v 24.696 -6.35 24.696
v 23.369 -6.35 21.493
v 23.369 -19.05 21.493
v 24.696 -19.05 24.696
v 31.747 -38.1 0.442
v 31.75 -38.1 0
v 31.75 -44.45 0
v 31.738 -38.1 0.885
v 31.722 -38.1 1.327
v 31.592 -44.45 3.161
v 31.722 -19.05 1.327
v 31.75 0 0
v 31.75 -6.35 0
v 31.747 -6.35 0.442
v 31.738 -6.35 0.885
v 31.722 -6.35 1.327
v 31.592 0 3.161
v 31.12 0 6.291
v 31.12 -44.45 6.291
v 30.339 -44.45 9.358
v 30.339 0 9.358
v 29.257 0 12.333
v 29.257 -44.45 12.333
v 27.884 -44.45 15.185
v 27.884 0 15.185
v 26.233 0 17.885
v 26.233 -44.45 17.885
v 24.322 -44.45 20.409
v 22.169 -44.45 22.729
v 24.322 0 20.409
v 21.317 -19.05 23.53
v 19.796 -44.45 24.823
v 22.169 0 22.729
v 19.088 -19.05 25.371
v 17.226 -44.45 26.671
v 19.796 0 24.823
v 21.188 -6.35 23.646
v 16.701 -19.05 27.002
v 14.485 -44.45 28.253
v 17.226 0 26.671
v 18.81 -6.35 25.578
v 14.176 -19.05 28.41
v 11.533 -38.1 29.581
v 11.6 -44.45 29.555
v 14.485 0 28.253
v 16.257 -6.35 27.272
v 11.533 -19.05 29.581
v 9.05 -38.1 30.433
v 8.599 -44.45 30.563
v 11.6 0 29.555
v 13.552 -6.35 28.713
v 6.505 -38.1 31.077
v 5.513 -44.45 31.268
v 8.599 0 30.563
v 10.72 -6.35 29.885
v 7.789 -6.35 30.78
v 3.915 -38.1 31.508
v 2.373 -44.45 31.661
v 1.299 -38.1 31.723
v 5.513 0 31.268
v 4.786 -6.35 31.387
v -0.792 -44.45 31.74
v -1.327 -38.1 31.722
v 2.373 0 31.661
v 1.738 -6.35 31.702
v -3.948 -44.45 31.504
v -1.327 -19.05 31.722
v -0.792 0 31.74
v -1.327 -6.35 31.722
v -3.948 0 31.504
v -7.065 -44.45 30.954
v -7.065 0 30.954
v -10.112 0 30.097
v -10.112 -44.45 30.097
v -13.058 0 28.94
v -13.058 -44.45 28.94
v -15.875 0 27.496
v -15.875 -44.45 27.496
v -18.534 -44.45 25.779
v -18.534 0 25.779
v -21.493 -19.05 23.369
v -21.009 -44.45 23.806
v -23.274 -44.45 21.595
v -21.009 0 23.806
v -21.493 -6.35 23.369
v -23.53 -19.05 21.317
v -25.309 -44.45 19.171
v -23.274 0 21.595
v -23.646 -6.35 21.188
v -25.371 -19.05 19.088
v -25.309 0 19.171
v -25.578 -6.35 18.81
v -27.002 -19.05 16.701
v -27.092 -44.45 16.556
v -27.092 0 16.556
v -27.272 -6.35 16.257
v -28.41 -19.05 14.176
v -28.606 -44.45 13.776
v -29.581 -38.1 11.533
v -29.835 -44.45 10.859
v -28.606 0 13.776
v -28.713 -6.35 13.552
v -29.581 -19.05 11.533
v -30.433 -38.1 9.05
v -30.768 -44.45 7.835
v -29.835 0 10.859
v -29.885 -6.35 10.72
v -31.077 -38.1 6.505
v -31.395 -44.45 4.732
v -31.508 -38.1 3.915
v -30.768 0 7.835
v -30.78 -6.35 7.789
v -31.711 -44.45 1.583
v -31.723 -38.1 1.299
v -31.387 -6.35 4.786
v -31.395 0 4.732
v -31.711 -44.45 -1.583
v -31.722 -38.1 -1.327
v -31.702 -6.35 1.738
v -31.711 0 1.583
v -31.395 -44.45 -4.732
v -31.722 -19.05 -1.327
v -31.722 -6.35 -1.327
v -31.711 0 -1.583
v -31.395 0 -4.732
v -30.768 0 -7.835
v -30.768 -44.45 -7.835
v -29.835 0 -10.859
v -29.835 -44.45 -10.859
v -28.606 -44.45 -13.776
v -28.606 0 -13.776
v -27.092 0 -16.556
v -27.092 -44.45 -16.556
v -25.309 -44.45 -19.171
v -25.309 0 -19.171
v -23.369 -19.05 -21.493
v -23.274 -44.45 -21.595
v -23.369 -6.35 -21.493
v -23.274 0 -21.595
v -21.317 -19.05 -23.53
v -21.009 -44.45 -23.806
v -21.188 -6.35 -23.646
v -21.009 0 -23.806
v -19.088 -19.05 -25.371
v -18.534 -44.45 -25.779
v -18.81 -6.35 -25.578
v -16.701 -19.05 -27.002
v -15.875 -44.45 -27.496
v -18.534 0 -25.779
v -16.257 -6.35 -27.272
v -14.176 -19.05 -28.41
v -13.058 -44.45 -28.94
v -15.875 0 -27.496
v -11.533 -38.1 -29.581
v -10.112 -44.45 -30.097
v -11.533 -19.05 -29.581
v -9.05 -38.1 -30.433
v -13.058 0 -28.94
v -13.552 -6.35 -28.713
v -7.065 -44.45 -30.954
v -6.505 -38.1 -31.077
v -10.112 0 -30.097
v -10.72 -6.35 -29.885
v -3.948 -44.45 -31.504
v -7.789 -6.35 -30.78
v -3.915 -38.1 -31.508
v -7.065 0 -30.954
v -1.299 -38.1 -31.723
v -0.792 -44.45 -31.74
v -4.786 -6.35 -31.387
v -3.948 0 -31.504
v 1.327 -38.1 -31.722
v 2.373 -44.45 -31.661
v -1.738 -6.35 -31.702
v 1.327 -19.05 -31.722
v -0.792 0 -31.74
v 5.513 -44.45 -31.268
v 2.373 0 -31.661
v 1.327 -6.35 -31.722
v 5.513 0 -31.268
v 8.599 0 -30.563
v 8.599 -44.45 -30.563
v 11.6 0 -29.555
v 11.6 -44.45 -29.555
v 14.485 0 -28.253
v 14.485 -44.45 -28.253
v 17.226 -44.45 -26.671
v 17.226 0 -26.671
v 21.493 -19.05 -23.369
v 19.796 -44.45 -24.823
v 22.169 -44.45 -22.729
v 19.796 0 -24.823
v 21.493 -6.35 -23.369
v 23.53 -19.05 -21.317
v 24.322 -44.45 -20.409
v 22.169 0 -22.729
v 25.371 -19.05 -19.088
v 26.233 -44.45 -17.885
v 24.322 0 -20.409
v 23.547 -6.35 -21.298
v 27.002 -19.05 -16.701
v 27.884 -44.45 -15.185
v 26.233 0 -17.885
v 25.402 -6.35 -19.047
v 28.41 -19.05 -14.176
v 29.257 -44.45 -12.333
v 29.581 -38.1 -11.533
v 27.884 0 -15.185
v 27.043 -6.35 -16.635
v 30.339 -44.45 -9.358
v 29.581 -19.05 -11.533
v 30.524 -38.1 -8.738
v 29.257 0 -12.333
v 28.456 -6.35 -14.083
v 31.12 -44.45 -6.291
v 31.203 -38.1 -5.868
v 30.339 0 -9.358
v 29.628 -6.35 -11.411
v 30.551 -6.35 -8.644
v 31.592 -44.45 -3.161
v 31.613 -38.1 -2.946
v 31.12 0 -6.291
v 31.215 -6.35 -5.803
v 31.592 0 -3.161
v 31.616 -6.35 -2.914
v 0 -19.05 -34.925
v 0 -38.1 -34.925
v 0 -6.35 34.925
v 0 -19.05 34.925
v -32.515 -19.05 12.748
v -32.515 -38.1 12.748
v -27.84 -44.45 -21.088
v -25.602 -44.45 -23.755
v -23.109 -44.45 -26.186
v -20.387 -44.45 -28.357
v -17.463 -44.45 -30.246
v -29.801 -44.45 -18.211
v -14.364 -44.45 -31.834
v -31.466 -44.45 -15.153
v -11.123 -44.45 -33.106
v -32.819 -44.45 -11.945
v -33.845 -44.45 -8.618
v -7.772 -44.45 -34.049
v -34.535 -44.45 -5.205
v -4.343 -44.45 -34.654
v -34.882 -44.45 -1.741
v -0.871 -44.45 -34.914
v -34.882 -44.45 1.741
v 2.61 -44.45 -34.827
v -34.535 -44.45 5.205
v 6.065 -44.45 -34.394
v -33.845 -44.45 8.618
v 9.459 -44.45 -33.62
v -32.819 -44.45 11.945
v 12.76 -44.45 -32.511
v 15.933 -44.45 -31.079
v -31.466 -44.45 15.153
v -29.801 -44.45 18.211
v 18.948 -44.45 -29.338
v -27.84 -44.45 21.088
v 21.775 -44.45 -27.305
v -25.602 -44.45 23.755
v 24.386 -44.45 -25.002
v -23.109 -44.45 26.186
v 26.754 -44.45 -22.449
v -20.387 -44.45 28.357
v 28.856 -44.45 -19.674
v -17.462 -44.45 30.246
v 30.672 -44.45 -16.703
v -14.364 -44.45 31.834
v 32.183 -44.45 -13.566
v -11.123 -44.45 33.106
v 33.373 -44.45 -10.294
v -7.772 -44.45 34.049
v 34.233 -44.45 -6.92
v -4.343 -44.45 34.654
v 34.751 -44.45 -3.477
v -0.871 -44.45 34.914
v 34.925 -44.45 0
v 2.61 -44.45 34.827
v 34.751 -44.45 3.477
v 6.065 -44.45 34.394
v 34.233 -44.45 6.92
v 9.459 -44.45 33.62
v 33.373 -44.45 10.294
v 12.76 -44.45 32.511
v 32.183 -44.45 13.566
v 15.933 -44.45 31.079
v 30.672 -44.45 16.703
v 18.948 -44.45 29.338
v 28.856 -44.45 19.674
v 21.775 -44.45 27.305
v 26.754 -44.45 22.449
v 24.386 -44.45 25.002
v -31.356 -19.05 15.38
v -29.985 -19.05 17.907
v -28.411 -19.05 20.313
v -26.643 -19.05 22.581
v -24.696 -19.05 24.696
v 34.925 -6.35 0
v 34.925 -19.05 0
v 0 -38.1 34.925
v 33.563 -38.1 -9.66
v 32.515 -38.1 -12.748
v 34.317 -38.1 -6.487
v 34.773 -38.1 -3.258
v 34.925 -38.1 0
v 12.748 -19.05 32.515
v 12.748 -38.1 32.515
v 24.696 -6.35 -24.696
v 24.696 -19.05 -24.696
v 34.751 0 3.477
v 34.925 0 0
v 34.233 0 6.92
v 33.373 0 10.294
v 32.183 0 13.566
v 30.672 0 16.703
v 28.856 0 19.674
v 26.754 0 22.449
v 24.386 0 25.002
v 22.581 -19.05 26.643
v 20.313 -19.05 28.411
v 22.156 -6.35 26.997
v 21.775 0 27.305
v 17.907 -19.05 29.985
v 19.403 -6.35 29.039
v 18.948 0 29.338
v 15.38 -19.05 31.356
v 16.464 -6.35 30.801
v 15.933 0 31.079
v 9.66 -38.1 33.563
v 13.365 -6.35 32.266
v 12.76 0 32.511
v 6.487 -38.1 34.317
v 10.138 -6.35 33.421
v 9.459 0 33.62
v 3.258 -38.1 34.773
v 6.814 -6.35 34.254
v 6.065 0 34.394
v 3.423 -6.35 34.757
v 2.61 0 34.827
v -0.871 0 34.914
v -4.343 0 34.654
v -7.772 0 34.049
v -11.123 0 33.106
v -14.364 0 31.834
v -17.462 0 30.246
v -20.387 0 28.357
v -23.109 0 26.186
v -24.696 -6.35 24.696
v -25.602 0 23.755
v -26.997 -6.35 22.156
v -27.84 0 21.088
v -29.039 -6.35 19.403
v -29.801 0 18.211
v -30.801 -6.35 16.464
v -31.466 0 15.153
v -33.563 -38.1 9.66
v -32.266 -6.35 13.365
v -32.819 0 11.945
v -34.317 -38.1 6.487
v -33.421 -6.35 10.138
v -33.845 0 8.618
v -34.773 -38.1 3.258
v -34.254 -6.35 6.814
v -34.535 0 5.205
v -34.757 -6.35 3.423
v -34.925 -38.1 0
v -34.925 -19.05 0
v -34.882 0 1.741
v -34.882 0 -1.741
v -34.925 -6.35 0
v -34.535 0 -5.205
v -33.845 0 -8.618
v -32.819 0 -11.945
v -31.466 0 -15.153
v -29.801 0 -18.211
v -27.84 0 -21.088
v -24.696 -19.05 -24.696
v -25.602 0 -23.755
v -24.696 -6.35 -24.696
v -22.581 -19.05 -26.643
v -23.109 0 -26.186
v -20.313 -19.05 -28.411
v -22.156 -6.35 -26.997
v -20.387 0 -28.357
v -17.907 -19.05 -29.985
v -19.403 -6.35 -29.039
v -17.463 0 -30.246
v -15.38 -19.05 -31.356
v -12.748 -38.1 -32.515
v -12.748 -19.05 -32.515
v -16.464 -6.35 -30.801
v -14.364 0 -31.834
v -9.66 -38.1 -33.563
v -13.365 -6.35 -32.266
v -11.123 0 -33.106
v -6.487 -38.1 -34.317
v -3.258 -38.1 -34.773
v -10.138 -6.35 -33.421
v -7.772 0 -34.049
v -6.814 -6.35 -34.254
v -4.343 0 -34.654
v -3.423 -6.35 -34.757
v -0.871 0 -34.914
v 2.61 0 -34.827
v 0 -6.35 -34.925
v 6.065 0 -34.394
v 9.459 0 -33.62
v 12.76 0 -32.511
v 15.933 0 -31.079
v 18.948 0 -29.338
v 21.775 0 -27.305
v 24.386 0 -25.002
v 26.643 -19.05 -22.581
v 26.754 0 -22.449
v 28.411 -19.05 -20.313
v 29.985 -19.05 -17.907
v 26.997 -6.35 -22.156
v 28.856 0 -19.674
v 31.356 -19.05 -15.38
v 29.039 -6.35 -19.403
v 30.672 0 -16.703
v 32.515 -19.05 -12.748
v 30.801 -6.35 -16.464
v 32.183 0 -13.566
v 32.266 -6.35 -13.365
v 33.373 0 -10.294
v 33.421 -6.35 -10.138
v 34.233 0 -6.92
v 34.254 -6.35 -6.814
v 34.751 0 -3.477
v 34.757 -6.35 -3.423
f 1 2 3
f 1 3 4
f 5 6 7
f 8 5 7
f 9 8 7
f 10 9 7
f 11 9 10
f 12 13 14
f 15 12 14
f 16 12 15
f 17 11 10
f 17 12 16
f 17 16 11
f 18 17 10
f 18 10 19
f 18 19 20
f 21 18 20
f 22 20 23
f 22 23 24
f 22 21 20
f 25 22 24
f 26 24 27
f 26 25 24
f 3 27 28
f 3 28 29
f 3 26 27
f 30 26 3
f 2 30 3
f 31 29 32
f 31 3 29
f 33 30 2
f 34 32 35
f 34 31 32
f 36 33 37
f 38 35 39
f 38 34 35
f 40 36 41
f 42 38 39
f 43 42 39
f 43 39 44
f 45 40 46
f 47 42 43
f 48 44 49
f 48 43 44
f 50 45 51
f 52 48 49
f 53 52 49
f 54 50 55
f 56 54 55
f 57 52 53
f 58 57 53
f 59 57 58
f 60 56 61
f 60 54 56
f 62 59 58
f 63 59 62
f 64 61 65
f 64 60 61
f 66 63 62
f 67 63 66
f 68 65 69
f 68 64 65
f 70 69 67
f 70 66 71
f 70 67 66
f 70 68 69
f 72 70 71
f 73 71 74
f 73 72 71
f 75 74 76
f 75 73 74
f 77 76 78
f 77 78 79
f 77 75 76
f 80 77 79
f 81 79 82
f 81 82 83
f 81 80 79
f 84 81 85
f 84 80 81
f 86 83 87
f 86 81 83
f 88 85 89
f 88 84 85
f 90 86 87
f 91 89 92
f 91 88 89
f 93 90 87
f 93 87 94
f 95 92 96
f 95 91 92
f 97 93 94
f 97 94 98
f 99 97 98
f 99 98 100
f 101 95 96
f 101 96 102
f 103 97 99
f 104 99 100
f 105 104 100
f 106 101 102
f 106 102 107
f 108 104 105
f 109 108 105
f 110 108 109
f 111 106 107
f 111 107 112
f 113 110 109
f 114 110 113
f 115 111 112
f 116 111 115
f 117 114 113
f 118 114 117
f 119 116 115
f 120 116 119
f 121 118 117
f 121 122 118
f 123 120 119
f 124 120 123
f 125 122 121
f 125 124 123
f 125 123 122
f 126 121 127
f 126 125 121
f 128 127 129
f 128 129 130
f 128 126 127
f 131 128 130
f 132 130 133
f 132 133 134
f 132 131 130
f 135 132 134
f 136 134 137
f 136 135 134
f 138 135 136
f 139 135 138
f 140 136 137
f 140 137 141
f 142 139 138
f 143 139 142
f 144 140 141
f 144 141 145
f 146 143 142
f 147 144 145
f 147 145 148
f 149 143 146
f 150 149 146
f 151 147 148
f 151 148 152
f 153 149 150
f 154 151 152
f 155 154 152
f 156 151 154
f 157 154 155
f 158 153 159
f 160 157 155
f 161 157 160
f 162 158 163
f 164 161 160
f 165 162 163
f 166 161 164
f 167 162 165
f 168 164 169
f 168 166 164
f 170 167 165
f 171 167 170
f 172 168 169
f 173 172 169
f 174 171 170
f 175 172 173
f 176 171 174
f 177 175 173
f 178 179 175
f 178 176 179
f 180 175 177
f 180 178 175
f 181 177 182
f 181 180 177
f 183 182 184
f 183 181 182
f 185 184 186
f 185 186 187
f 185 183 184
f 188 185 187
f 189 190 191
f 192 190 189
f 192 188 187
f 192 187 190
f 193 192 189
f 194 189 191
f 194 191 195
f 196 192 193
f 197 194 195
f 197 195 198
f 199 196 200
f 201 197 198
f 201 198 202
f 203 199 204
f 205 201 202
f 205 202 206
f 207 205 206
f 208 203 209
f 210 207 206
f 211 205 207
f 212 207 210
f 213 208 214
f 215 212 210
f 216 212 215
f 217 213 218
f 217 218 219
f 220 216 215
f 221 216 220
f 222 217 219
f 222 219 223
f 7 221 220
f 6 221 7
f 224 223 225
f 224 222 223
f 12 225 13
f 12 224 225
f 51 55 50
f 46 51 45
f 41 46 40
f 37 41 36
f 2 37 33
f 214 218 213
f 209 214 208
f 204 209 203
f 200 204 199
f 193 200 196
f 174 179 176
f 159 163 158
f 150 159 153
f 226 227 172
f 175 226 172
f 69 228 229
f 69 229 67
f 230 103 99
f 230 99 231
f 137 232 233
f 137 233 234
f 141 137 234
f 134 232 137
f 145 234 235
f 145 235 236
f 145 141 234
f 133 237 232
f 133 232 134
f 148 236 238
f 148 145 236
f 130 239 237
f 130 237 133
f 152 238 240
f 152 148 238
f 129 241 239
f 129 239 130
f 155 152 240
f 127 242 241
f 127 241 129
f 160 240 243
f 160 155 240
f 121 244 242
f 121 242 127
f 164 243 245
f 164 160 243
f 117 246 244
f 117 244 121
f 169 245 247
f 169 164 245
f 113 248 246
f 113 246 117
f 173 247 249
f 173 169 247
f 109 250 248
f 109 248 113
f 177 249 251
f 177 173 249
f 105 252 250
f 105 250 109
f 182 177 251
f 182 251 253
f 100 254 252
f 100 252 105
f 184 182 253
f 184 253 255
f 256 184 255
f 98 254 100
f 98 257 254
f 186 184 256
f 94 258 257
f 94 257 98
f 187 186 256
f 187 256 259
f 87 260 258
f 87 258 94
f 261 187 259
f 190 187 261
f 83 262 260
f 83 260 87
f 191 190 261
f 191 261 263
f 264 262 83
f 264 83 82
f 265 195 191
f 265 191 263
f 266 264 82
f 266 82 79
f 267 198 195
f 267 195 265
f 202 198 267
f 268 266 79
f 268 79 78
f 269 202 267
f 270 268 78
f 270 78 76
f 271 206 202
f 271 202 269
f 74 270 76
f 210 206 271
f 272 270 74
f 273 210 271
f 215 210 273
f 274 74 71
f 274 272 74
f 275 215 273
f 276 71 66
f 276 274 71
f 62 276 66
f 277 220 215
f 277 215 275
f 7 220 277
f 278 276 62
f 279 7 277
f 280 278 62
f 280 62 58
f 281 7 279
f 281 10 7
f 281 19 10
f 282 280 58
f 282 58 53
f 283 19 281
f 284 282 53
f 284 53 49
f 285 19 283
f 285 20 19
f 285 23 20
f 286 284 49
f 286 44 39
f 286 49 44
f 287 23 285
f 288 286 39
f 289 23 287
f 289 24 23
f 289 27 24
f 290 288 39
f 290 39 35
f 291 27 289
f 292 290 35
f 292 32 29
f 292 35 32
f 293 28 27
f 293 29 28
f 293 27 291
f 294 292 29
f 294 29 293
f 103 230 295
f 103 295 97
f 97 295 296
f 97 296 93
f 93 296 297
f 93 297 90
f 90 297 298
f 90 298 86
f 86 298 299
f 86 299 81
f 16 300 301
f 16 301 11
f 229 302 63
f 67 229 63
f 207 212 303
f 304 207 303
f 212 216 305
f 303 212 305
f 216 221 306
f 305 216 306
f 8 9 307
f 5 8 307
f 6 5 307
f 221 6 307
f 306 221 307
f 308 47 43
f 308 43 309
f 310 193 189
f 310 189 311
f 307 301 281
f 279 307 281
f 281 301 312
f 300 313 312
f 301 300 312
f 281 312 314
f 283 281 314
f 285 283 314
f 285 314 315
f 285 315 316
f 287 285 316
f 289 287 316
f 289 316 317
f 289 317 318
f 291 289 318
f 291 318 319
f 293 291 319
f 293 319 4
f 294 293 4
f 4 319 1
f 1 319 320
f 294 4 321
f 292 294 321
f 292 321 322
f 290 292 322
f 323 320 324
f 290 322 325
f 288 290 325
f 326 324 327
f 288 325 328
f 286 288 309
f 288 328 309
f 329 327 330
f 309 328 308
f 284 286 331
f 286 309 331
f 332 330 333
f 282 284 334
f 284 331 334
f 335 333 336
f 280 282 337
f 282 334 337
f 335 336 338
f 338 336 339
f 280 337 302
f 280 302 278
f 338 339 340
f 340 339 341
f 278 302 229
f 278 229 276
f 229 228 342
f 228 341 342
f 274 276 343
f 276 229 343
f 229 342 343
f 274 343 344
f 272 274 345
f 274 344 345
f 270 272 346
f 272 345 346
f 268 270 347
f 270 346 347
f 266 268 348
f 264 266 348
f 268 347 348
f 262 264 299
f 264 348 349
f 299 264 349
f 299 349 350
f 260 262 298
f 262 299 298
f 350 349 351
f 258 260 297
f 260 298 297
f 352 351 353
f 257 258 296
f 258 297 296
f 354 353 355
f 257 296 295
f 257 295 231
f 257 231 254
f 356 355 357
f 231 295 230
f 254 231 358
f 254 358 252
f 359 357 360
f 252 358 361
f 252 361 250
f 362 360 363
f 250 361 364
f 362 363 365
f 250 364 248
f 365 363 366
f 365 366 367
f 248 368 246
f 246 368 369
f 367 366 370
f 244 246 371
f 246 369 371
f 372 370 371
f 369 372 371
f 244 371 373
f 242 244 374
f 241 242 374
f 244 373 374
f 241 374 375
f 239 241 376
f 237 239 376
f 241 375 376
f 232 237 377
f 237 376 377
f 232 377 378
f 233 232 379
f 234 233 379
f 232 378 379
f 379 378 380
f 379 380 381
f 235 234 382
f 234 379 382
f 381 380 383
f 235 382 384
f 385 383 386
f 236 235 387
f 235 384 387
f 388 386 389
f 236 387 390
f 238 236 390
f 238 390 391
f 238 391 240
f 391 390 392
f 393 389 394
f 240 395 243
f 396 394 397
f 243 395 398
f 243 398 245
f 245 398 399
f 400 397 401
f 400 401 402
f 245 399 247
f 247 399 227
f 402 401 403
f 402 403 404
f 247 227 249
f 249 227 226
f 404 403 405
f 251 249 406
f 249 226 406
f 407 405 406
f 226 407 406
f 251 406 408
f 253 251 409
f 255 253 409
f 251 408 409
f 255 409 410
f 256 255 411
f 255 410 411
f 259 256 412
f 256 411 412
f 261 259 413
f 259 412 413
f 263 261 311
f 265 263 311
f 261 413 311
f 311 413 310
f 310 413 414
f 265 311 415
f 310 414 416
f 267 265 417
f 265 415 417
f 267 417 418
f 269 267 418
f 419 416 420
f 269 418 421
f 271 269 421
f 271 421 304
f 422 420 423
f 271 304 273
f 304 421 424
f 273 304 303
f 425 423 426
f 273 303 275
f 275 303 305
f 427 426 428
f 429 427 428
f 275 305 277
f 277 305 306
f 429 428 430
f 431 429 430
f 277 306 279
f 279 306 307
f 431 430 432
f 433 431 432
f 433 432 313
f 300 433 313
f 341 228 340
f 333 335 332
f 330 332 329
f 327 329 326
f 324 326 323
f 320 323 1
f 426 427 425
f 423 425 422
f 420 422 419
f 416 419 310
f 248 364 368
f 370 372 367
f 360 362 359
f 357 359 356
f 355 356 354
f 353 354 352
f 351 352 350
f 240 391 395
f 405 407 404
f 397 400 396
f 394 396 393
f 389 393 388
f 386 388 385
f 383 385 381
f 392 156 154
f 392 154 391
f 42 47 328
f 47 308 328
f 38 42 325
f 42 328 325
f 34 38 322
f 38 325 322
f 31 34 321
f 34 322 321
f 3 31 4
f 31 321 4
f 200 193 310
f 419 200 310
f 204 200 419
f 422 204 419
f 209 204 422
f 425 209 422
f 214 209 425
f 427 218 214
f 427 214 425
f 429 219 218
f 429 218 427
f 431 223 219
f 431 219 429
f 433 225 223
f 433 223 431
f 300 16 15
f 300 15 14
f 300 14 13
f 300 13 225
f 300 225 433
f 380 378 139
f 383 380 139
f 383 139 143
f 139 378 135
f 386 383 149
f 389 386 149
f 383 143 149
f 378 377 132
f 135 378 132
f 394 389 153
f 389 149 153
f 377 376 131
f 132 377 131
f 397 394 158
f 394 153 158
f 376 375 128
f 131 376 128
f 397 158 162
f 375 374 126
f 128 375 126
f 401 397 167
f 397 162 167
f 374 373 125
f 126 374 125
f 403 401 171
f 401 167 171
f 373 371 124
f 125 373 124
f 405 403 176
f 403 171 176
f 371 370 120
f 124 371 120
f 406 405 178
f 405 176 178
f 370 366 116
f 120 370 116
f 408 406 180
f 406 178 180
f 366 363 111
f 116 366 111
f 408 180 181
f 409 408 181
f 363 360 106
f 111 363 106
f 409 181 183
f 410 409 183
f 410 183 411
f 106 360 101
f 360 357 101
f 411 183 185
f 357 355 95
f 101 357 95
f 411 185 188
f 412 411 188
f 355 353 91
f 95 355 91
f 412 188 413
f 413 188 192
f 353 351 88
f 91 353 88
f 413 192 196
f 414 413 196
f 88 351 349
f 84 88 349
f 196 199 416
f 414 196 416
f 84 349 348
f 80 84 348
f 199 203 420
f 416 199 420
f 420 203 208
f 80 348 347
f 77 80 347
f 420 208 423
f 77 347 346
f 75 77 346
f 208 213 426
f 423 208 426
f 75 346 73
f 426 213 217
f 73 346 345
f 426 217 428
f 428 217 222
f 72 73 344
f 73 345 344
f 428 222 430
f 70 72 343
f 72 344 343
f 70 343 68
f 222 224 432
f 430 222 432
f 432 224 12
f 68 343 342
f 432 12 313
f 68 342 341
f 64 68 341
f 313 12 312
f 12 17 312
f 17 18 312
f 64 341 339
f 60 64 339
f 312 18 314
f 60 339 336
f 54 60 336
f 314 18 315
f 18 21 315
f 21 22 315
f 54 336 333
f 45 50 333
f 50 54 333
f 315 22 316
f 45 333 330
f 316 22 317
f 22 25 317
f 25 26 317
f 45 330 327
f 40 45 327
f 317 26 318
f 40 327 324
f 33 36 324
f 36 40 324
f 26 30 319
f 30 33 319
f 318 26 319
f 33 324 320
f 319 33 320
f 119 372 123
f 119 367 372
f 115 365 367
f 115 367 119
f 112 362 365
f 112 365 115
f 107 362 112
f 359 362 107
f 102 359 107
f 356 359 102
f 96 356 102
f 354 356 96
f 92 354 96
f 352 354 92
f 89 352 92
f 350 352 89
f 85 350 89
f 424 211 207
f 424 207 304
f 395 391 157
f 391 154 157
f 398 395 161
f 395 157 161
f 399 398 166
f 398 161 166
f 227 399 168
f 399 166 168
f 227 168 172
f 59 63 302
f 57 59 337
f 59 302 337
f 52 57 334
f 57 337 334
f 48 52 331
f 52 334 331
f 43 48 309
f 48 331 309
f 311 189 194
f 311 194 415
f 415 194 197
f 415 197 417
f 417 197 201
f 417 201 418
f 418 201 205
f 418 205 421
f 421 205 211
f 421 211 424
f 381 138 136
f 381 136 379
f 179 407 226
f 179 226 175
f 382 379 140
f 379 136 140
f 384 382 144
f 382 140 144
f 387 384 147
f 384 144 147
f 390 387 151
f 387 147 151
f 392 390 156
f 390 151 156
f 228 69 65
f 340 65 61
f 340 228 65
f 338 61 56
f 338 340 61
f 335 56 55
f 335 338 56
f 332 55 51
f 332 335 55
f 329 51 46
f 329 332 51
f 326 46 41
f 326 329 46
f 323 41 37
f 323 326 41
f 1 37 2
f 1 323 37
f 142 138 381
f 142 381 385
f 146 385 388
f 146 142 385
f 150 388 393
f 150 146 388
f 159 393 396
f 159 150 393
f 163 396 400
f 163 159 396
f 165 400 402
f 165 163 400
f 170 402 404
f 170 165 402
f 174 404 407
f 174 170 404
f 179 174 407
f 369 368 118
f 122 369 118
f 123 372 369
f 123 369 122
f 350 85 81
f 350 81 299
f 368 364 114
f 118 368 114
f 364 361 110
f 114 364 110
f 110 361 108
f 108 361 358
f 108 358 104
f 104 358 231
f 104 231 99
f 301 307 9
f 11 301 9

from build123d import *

# Parameters (mm, degrees)
F0_R     = 34.925
F0_R_2   = 31.75
F1_DEPTH = 44.45
F5_DEPTH = 12.7
F8_DEPTH = 19.05


with BuildPart() as f1:
    # F0 (on Front) → F1 (new body)
    with BuildSketch(Plane.XZ):
        Circle(F0_R)
        Circle(F0_R_2, mode=Mode.SUBTRACT)
    extrude(amount=F1_DEPTH)

    # F4 (on offset) → F5 (cut)
    with BuildSketch(Plane.XZ.offset(6.35)):
        Polygon((-29.058365, -2.43004), (-18.829069, 22.265665), (-27.629022, 25.910724), (-37.858318, 1.21502), align=None)
        Polygon((25.910724, 27.629022), (1.21502, 37.858318), (-2.43004, 29.058365), (22.265665, 18.829069), align=None)
        Polygon((29.058365, 2.43004), (18.829069, -22.265665), (27.629022, -25.910724), (37.858318, -1.21502), align=None)
        Polygon((2.43004, -29.058365), (-22.265665, -18.829069), (-25.910724, -27.629022), (-1.21502, -37.858318), align=None)
    extrude(amount=F5_DEPTH, mode=Mode.SUBTRACT)

    # F7 (on offset) → F8 (cut)
    with BuildSketch(Plane.XZ.offset(19.05)):
        Polygon((0, 34.925), (-2.430039, 29.058366), (9.303231, 24.198287), (12.94829, 32.998238), (1.21502, 37.858318), align=None)
        Polygon((-34.925, 0), (-29.058366, -2.430039), (-24.198287, 9.303231), (-32.998238, 12.94829), (-37.858318, 1.21502), align=None)
        Polygon((0, -34.925), (2.430039, -29.058366), (-9.303231, -24.198287), (-12.94829, -32.998238), (-1.21502, -37.858318), align=None)
        Polygon((34.925, 0), (29.058366, 2.430039), (24.198287, -9.303231), (32.998238, -12.94829), (37.858318, -1.21502), align=None)
    extrude(amount=F8_DEPTH, mode=Mode.SUBTRACT)


solid = f1.part
